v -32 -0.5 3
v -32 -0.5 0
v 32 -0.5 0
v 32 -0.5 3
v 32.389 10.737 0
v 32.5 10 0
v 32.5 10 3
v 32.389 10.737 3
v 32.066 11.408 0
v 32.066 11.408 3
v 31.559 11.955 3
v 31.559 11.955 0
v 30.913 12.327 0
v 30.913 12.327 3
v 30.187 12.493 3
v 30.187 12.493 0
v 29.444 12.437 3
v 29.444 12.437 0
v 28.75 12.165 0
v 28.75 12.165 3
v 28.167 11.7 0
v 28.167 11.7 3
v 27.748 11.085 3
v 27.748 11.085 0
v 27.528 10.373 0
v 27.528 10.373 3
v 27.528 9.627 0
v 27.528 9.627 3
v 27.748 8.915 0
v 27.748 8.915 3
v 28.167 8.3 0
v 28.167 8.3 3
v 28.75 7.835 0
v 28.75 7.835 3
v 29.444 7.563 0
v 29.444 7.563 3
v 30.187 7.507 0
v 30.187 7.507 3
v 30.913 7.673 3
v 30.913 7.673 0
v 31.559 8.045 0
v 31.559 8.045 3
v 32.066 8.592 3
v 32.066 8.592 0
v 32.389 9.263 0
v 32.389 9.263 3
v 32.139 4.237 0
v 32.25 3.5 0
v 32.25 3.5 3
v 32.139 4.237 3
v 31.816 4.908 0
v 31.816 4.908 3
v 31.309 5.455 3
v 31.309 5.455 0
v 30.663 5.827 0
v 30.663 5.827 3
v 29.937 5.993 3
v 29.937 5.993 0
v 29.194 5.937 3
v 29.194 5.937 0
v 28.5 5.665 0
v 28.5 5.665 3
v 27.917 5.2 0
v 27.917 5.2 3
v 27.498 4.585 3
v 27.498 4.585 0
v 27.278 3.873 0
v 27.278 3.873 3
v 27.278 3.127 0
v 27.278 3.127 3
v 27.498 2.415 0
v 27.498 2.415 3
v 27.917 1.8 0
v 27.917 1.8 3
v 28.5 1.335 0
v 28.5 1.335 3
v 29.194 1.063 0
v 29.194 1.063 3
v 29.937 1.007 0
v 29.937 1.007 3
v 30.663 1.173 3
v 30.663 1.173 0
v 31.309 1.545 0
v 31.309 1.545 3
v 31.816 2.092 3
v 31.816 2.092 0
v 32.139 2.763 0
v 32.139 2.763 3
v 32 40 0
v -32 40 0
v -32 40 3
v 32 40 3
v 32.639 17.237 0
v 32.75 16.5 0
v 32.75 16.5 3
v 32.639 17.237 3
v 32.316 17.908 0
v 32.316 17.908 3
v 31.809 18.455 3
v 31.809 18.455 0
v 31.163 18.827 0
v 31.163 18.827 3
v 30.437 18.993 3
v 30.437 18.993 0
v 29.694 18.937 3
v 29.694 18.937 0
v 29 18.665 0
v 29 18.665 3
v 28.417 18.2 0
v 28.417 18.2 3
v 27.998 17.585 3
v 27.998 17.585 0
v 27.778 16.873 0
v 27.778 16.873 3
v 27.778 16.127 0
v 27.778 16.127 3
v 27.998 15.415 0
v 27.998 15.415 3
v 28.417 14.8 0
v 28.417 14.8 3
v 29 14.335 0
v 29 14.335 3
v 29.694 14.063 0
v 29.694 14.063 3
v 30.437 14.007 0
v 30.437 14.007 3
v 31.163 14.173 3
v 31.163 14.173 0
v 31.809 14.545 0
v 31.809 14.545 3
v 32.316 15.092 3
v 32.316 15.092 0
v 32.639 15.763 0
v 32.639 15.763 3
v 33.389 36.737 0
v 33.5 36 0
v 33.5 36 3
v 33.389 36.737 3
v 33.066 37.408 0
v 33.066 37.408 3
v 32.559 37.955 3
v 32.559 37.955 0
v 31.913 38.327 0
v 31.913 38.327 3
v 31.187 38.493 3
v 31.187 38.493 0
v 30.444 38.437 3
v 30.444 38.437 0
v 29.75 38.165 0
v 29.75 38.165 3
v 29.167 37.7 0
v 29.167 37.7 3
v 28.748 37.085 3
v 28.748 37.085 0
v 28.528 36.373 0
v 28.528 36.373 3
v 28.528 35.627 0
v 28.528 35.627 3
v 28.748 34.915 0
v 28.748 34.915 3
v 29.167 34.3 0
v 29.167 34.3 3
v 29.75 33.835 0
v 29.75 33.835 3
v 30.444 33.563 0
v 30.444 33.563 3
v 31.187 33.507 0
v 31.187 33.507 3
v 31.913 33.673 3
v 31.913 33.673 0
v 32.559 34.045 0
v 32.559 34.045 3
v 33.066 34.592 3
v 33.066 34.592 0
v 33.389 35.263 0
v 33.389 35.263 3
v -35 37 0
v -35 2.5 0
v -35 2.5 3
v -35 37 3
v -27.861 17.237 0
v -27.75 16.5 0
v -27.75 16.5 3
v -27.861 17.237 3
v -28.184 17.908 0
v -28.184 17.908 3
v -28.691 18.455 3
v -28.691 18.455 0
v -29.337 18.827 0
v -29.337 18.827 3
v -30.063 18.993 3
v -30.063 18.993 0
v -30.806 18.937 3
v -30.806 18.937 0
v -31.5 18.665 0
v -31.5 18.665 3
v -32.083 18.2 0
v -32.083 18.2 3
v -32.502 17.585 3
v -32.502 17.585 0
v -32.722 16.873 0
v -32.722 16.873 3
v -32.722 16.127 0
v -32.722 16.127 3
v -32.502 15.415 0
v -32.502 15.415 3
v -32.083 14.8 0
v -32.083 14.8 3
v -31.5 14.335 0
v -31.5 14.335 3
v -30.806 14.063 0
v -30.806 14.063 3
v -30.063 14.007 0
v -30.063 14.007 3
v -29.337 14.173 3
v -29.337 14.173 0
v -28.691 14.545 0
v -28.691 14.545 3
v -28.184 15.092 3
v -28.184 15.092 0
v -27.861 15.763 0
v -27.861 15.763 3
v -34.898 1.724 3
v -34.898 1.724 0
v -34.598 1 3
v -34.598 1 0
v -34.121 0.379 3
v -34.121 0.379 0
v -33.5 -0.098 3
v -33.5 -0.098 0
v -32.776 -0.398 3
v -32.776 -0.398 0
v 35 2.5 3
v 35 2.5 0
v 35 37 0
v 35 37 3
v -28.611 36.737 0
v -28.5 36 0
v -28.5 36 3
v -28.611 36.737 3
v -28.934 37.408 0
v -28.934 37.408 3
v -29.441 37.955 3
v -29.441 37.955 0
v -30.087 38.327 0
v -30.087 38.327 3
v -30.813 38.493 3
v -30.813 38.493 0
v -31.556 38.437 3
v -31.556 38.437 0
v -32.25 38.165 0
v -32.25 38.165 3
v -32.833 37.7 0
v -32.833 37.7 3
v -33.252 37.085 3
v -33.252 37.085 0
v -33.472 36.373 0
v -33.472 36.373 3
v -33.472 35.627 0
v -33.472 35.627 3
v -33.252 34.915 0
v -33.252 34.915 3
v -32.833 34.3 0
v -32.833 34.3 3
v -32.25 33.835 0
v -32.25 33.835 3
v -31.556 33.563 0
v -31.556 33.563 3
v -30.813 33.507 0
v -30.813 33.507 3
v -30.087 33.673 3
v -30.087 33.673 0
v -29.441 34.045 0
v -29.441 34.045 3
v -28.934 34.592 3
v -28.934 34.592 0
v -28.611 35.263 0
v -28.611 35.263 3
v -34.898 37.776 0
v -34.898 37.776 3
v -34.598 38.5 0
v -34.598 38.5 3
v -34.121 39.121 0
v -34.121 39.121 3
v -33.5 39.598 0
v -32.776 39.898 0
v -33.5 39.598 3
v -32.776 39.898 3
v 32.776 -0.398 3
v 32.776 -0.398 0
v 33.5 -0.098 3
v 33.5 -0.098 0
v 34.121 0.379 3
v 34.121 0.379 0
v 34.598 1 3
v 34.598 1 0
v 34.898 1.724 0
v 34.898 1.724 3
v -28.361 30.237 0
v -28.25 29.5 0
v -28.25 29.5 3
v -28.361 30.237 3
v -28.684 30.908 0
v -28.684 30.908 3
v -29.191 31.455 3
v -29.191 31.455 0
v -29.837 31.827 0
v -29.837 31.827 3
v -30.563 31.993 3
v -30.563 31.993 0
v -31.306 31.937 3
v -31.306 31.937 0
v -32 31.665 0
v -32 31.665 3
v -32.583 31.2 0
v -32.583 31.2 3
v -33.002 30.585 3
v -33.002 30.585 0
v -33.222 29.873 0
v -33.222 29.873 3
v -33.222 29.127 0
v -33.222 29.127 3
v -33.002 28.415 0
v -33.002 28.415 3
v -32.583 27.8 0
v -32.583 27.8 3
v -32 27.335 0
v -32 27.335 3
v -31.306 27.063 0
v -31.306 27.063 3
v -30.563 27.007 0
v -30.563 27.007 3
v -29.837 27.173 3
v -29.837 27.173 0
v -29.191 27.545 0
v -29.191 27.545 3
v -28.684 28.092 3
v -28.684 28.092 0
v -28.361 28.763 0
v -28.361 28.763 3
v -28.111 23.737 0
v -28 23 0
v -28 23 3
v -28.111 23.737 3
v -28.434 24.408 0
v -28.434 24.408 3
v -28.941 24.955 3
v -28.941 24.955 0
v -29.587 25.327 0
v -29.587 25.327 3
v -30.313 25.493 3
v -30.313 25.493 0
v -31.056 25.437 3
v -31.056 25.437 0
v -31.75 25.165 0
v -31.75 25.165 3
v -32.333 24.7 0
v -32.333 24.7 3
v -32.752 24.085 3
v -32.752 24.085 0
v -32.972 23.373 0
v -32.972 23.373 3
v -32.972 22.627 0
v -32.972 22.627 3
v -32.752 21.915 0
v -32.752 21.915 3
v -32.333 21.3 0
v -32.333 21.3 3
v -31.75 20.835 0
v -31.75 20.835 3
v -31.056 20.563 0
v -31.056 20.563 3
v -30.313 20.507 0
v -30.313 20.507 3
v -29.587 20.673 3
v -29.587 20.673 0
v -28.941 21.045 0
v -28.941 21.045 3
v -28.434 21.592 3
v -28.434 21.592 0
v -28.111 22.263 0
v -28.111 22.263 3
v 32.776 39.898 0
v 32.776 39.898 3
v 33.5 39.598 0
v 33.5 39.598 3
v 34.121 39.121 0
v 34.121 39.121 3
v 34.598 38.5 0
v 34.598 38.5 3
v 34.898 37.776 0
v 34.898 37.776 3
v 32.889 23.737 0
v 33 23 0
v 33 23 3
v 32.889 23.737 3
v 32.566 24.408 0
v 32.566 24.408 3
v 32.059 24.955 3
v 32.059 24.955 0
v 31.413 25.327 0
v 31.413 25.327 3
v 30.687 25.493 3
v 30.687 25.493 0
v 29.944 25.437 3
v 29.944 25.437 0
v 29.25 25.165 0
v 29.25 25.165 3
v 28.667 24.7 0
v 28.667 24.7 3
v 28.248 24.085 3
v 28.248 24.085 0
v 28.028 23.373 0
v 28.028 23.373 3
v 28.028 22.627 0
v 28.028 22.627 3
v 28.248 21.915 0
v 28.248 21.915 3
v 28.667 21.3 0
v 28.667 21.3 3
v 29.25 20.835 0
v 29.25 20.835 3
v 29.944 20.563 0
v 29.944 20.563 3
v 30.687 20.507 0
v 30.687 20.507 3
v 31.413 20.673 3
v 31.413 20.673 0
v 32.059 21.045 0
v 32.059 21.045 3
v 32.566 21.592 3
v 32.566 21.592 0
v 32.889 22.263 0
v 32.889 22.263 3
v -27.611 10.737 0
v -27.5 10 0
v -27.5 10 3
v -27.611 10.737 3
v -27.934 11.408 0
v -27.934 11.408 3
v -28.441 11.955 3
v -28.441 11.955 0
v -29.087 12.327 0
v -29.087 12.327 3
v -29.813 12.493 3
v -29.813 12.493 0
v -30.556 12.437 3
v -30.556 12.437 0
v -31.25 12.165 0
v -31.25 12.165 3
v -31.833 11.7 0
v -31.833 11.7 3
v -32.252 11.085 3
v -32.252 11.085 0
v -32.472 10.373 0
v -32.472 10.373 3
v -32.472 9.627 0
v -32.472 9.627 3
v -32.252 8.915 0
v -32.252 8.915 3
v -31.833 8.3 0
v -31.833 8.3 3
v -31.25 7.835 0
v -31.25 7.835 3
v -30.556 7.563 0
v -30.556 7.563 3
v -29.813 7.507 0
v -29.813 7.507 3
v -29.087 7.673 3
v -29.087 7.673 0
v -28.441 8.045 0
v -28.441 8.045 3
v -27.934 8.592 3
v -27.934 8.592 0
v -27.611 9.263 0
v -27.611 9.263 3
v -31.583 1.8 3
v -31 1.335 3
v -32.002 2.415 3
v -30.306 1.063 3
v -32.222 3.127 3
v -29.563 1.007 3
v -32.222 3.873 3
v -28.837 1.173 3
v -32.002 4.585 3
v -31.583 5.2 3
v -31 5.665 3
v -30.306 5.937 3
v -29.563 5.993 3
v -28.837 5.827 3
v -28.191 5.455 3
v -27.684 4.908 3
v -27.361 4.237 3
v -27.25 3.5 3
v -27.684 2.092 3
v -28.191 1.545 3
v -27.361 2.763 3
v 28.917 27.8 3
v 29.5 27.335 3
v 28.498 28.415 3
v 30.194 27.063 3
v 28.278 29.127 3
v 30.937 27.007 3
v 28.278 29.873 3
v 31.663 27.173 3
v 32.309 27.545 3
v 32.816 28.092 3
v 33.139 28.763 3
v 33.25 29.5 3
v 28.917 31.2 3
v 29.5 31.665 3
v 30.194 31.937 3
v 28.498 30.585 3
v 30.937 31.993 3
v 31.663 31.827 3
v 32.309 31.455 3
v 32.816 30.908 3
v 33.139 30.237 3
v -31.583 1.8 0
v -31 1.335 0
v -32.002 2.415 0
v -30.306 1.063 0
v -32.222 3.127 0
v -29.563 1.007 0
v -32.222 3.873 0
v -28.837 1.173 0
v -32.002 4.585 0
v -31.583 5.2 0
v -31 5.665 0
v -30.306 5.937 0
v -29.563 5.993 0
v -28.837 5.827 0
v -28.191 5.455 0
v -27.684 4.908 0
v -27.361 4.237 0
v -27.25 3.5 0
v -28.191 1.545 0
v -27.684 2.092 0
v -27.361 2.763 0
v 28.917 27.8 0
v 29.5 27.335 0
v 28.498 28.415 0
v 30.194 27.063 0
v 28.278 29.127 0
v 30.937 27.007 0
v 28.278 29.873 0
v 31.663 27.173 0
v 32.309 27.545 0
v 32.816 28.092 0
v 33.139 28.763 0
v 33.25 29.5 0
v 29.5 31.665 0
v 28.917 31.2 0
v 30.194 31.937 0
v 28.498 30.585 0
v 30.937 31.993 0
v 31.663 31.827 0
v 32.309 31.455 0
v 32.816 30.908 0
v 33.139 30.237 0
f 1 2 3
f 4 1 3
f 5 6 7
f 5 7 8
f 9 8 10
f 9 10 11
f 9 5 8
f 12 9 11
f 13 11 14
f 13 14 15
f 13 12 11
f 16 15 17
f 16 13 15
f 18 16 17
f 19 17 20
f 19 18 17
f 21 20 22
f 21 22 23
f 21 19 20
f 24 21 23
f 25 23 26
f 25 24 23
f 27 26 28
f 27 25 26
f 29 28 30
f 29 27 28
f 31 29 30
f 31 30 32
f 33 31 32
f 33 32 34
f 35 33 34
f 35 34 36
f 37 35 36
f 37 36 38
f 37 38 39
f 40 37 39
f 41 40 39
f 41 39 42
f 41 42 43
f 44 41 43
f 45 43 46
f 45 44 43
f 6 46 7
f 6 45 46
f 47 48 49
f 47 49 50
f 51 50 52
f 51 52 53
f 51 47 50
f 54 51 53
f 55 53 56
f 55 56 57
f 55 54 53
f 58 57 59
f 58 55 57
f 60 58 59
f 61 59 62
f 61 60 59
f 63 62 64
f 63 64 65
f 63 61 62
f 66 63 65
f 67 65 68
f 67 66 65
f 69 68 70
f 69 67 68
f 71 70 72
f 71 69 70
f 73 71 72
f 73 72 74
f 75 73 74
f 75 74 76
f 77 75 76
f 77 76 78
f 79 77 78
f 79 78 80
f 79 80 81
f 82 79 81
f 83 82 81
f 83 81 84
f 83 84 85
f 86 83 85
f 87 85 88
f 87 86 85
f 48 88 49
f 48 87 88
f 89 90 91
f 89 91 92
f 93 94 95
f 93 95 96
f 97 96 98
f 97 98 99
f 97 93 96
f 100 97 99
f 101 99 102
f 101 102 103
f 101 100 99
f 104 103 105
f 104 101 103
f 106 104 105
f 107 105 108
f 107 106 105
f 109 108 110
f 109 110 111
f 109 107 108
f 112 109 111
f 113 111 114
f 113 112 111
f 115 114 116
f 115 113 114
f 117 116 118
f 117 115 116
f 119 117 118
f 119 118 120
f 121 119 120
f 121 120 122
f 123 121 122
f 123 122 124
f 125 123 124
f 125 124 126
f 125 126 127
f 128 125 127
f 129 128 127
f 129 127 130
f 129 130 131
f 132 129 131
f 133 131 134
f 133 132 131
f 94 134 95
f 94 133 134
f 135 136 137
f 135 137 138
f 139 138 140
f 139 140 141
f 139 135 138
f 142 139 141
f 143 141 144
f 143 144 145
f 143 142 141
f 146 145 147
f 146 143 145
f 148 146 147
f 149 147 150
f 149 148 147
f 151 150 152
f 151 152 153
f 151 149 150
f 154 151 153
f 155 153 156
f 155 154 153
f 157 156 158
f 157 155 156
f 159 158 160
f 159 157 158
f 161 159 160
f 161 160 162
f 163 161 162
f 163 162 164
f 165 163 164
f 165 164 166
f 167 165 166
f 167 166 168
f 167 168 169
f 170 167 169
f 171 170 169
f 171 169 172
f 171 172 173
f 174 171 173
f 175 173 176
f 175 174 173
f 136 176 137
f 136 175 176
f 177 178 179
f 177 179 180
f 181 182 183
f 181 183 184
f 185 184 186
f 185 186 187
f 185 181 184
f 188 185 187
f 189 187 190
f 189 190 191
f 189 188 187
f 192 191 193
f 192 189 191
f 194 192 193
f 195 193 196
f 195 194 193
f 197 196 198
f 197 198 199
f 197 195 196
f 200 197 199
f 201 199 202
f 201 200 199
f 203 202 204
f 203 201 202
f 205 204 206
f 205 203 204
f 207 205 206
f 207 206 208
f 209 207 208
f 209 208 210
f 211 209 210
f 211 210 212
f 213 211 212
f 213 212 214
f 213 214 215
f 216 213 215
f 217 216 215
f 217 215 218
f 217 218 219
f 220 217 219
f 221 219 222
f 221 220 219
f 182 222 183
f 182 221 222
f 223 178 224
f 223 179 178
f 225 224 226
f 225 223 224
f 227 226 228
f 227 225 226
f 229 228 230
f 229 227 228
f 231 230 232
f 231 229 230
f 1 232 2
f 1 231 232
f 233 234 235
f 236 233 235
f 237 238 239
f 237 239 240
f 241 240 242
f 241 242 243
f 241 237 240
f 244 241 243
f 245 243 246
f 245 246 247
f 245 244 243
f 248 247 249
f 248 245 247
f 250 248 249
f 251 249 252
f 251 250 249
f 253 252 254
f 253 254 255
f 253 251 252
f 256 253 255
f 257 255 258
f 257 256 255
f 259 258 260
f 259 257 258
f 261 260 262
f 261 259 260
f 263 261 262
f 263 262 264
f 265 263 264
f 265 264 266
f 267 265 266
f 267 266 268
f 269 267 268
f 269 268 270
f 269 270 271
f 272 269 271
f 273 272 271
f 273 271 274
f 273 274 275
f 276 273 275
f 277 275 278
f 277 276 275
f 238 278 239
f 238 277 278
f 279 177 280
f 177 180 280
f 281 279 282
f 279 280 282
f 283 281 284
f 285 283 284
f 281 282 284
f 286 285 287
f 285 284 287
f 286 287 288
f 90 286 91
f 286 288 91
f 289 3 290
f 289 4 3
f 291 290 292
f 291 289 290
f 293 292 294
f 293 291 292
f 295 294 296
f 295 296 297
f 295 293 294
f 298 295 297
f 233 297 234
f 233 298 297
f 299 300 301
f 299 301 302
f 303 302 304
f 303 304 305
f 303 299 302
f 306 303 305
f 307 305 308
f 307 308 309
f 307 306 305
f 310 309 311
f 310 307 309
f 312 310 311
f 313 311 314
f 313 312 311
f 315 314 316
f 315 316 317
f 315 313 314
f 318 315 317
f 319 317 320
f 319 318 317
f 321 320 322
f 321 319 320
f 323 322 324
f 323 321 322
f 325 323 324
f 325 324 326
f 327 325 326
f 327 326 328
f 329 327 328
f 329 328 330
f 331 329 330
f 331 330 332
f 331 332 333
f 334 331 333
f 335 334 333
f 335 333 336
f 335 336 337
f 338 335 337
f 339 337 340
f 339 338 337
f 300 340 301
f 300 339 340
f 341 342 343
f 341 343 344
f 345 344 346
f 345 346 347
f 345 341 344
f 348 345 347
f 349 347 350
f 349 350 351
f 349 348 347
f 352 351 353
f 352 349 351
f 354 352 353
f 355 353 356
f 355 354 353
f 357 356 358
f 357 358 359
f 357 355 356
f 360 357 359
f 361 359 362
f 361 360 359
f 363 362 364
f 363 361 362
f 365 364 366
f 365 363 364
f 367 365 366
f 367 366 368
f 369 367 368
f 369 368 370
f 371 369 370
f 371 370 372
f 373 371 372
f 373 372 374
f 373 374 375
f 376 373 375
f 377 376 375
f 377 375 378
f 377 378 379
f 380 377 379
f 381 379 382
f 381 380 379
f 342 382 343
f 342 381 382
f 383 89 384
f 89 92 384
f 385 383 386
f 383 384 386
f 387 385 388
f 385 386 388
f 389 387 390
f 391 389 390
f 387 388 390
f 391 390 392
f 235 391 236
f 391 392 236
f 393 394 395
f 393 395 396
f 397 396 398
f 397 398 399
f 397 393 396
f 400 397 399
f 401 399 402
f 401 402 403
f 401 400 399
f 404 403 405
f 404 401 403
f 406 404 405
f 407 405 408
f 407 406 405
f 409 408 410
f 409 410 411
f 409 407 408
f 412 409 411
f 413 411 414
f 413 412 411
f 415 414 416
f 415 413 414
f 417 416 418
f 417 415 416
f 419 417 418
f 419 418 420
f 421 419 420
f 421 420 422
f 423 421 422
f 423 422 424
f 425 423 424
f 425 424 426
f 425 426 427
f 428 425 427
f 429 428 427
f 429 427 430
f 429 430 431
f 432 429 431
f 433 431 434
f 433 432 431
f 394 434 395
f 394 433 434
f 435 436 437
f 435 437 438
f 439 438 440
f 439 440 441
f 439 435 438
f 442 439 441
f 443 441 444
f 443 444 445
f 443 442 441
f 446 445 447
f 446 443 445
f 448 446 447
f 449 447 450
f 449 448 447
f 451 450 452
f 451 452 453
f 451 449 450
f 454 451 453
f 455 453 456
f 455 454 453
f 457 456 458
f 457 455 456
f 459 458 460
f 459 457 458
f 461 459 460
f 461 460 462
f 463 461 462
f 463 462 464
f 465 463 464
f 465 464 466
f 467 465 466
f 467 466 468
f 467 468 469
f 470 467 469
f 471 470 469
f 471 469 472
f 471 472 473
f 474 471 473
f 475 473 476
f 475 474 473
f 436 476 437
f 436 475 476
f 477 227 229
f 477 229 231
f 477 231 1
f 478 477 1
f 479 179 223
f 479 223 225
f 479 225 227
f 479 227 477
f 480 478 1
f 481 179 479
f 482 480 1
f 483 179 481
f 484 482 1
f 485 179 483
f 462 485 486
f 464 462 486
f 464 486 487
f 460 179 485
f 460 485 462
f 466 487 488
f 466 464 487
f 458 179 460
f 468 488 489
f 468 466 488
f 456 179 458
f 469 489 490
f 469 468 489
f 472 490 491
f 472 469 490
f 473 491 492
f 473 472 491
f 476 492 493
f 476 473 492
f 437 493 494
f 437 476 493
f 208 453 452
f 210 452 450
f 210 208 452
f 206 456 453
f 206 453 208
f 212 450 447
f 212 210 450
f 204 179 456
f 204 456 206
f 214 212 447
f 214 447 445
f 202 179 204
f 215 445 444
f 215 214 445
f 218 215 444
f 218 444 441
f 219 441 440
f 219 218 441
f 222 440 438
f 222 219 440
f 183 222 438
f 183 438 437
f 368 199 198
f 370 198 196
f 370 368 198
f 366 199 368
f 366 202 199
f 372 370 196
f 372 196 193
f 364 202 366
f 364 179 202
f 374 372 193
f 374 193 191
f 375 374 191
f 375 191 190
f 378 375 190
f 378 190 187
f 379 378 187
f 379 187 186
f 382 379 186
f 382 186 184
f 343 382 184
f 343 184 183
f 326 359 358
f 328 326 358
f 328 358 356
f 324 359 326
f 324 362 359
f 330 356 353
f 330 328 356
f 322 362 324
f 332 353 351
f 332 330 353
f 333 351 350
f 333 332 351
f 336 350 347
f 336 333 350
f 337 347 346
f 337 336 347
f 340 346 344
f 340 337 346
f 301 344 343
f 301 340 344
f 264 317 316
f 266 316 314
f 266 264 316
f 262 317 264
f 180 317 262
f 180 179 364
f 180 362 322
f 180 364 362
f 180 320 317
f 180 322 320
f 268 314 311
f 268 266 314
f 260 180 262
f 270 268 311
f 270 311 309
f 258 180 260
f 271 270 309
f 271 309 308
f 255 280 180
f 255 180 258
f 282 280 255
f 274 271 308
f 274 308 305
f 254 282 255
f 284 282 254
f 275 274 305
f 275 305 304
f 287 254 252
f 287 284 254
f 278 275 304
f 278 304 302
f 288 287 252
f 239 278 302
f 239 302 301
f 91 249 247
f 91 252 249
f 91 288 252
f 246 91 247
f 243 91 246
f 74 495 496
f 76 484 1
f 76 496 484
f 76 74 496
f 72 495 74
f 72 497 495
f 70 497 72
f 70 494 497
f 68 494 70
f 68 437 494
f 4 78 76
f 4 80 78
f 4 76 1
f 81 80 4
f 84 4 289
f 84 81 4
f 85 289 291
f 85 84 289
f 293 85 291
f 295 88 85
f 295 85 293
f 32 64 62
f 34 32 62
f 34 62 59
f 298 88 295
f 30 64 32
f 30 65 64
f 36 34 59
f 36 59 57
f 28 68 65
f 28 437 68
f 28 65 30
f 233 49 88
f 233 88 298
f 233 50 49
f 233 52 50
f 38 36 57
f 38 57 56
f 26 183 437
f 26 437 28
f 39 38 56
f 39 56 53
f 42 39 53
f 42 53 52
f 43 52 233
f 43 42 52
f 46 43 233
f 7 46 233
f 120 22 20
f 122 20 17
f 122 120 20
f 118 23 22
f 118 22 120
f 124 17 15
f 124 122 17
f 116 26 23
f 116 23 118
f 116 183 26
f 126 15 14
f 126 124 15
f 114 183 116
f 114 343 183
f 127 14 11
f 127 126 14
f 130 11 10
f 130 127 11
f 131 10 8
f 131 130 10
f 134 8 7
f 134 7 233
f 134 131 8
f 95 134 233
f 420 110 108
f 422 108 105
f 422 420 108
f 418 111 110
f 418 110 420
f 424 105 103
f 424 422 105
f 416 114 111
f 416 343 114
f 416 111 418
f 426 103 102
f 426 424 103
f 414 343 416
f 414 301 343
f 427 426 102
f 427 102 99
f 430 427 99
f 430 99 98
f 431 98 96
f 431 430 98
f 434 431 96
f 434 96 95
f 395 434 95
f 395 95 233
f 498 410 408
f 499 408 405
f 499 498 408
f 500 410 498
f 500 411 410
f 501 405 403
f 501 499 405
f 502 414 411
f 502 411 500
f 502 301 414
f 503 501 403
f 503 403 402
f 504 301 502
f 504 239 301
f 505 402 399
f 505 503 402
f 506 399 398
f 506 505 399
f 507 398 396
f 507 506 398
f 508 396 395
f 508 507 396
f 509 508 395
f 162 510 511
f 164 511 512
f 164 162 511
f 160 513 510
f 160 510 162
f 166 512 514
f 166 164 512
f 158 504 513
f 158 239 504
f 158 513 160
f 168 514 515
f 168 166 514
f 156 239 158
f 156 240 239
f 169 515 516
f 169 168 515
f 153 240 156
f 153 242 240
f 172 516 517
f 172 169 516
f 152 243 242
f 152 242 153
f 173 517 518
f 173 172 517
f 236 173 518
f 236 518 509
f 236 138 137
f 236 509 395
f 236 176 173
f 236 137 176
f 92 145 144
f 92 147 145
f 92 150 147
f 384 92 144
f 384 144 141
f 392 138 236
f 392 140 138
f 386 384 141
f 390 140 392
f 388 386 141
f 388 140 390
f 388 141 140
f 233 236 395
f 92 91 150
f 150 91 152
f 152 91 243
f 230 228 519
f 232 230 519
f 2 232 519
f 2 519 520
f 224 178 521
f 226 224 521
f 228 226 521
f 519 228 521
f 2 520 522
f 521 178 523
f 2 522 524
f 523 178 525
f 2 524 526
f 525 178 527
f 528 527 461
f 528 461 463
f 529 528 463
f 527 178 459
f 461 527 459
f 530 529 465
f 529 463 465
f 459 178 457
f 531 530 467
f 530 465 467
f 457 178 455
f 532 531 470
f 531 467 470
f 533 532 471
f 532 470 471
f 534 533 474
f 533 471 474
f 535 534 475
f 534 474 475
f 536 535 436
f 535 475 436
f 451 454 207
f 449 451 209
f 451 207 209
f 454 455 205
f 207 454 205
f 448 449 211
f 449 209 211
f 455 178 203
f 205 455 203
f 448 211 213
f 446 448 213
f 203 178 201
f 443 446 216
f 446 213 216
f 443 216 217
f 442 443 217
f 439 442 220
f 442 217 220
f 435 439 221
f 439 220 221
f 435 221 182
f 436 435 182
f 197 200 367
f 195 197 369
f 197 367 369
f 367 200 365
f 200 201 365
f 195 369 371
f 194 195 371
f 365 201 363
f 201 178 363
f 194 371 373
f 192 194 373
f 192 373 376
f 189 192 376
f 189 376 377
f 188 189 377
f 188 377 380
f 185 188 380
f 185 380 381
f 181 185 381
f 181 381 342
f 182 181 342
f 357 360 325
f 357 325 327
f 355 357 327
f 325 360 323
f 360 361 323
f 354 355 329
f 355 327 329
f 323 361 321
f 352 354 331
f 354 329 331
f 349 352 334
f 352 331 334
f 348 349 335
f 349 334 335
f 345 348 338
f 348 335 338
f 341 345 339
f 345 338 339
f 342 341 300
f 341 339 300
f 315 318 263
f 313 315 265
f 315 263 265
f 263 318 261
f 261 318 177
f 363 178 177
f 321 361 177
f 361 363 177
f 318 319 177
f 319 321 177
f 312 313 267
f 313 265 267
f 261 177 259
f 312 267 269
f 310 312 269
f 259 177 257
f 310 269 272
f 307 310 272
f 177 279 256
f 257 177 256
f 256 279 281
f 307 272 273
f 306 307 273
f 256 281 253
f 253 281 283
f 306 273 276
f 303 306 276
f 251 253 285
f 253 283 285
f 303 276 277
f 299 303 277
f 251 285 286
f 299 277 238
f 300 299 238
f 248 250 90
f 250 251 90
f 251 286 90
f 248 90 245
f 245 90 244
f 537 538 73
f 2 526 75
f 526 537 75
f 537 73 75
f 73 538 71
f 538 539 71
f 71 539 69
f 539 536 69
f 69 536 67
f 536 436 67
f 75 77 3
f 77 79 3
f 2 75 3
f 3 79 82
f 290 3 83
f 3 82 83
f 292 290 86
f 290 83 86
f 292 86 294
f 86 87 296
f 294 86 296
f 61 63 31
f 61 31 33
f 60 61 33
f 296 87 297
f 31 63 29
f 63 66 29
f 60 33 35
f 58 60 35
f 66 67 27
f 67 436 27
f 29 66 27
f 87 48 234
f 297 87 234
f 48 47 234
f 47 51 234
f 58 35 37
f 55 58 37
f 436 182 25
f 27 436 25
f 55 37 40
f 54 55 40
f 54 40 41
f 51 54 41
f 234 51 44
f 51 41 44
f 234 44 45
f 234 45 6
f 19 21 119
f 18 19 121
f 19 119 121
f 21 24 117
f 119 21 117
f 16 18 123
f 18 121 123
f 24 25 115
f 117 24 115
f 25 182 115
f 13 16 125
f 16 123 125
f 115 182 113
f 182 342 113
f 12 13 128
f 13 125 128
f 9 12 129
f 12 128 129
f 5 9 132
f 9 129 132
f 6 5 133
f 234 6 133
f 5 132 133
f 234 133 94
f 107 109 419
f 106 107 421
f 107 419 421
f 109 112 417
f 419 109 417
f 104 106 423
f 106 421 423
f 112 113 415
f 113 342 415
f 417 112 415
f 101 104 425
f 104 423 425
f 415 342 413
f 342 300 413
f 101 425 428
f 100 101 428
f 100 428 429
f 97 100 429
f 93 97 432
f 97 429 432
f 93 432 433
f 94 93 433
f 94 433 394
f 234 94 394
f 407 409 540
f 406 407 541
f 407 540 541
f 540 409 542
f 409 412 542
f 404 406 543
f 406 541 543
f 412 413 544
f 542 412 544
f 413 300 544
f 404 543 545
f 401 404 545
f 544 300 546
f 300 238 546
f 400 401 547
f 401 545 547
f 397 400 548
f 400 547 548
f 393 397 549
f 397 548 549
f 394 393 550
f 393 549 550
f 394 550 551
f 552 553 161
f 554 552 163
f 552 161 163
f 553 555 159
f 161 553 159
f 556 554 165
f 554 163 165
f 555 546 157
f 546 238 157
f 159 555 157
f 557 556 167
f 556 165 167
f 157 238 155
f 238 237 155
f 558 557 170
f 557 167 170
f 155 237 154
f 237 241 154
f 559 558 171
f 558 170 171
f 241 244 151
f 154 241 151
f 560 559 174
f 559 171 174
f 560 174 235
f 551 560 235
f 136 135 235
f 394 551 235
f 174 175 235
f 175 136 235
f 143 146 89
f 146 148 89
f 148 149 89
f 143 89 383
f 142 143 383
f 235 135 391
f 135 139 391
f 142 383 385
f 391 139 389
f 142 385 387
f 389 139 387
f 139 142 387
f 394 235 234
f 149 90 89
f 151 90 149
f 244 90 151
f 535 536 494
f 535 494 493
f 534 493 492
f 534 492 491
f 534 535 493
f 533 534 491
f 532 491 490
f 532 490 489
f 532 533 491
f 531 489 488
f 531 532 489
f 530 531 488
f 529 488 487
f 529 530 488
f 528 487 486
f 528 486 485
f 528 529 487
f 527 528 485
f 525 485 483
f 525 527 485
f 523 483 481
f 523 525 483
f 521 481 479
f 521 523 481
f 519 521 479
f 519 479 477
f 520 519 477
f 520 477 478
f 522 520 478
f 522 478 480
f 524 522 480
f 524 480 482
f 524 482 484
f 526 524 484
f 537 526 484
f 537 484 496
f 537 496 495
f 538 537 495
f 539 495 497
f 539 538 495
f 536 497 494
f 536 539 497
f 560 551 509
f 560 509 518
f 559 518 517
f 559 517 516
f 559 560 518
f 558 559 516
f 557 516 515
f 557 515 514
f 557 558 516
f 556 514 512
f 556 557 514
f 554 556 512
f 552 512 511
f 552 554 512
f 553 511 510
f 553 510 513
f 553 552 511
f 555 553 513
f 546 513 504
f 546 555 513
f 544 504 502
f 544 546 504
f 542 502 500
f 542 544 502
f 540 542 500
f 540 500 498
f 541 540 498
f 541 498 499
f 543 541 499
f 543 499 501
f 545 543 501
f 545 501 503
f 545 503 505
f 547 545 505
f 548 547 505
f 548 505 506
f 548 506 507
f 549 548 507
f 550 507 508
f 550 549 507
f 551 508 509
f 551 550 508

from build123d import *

# Parameters (mm, degrees)
SKETCH1_W           = 70
SKETCH1_H           = 40.5
SKETCH1_R           = 2.5
BOSS_EXTRUDE1_DEPTH = 3
FILLET1_R           = 3


with BuildPart() as part:
    # Sketch1 → Boss-Extrude1 (new body)
    with BuildSketch(Plane.XY):
        with Locations((0, 19.75)):
            Rectangle(SKETCH1_W, SKETCH1_H)
        with Locations((-29.75, 3.5)):
            Circle(SKETCH1_R, mode=Mode.SUBTRACT)
        with Locations((-30, 10)):
            Circle(SKETCH1_R, mode=Mode.SUBTRACT)
        with Locations((-30.25, 16.5)):
            Circle(SKETCH1_R, mode=Mode.SUBTRACT)
        with Locations((-30.5, 23)):
            Circle(SKETCH1_R, mode=Mode.SUBTRACT)
        with Locations((-30.75, 29.5)):
            Circle(SKETCH1_R, mode=Mode.SUBTRACT)
        with Locations((-31, 36)):
            Circle(SKETCH1_R, mode=Mode.SUBTRACT)
        with Locations((29.75, 3.5)):
            Circle(SKETCH1_R, mode=Mode.SUBTRACT)
        with Locations((30, 10)):
            Circle(SKETCH1_R, mode=Mode.SUBTRACT)
        with Locations((30.25, 16.5)):
            Circle(SKETCH1_R, mode=Mode.SUBTRACT)
        with Locations((30.5, 23)):
            Circle(SKETCH1_R, mode=Mode.SUBTRACT)
        with Locations((30.75, 29.5)):
            Circle(SKETCH1_R, mode=Mode.SUBTRACT)
        with Locations((31, 36)):
            Circle(SKETCH1_R, mode=Mode.SUBTRACT)
    extrude(amount=BOSS_EXTRUDE1_DEPTH)

    # Fillet1
    fillet1_edges = [part.edges().sort_by_distance(p)[0] for p in [
        (-35, 40, 1.5),
        (35, 40, 1.5),
        (35, -0.5, 1.5),
        (-35, -0.5, 1.5),
    ]]
    fillet(fillet1_edges, radius=FILLET1_R)


solid = part.part
